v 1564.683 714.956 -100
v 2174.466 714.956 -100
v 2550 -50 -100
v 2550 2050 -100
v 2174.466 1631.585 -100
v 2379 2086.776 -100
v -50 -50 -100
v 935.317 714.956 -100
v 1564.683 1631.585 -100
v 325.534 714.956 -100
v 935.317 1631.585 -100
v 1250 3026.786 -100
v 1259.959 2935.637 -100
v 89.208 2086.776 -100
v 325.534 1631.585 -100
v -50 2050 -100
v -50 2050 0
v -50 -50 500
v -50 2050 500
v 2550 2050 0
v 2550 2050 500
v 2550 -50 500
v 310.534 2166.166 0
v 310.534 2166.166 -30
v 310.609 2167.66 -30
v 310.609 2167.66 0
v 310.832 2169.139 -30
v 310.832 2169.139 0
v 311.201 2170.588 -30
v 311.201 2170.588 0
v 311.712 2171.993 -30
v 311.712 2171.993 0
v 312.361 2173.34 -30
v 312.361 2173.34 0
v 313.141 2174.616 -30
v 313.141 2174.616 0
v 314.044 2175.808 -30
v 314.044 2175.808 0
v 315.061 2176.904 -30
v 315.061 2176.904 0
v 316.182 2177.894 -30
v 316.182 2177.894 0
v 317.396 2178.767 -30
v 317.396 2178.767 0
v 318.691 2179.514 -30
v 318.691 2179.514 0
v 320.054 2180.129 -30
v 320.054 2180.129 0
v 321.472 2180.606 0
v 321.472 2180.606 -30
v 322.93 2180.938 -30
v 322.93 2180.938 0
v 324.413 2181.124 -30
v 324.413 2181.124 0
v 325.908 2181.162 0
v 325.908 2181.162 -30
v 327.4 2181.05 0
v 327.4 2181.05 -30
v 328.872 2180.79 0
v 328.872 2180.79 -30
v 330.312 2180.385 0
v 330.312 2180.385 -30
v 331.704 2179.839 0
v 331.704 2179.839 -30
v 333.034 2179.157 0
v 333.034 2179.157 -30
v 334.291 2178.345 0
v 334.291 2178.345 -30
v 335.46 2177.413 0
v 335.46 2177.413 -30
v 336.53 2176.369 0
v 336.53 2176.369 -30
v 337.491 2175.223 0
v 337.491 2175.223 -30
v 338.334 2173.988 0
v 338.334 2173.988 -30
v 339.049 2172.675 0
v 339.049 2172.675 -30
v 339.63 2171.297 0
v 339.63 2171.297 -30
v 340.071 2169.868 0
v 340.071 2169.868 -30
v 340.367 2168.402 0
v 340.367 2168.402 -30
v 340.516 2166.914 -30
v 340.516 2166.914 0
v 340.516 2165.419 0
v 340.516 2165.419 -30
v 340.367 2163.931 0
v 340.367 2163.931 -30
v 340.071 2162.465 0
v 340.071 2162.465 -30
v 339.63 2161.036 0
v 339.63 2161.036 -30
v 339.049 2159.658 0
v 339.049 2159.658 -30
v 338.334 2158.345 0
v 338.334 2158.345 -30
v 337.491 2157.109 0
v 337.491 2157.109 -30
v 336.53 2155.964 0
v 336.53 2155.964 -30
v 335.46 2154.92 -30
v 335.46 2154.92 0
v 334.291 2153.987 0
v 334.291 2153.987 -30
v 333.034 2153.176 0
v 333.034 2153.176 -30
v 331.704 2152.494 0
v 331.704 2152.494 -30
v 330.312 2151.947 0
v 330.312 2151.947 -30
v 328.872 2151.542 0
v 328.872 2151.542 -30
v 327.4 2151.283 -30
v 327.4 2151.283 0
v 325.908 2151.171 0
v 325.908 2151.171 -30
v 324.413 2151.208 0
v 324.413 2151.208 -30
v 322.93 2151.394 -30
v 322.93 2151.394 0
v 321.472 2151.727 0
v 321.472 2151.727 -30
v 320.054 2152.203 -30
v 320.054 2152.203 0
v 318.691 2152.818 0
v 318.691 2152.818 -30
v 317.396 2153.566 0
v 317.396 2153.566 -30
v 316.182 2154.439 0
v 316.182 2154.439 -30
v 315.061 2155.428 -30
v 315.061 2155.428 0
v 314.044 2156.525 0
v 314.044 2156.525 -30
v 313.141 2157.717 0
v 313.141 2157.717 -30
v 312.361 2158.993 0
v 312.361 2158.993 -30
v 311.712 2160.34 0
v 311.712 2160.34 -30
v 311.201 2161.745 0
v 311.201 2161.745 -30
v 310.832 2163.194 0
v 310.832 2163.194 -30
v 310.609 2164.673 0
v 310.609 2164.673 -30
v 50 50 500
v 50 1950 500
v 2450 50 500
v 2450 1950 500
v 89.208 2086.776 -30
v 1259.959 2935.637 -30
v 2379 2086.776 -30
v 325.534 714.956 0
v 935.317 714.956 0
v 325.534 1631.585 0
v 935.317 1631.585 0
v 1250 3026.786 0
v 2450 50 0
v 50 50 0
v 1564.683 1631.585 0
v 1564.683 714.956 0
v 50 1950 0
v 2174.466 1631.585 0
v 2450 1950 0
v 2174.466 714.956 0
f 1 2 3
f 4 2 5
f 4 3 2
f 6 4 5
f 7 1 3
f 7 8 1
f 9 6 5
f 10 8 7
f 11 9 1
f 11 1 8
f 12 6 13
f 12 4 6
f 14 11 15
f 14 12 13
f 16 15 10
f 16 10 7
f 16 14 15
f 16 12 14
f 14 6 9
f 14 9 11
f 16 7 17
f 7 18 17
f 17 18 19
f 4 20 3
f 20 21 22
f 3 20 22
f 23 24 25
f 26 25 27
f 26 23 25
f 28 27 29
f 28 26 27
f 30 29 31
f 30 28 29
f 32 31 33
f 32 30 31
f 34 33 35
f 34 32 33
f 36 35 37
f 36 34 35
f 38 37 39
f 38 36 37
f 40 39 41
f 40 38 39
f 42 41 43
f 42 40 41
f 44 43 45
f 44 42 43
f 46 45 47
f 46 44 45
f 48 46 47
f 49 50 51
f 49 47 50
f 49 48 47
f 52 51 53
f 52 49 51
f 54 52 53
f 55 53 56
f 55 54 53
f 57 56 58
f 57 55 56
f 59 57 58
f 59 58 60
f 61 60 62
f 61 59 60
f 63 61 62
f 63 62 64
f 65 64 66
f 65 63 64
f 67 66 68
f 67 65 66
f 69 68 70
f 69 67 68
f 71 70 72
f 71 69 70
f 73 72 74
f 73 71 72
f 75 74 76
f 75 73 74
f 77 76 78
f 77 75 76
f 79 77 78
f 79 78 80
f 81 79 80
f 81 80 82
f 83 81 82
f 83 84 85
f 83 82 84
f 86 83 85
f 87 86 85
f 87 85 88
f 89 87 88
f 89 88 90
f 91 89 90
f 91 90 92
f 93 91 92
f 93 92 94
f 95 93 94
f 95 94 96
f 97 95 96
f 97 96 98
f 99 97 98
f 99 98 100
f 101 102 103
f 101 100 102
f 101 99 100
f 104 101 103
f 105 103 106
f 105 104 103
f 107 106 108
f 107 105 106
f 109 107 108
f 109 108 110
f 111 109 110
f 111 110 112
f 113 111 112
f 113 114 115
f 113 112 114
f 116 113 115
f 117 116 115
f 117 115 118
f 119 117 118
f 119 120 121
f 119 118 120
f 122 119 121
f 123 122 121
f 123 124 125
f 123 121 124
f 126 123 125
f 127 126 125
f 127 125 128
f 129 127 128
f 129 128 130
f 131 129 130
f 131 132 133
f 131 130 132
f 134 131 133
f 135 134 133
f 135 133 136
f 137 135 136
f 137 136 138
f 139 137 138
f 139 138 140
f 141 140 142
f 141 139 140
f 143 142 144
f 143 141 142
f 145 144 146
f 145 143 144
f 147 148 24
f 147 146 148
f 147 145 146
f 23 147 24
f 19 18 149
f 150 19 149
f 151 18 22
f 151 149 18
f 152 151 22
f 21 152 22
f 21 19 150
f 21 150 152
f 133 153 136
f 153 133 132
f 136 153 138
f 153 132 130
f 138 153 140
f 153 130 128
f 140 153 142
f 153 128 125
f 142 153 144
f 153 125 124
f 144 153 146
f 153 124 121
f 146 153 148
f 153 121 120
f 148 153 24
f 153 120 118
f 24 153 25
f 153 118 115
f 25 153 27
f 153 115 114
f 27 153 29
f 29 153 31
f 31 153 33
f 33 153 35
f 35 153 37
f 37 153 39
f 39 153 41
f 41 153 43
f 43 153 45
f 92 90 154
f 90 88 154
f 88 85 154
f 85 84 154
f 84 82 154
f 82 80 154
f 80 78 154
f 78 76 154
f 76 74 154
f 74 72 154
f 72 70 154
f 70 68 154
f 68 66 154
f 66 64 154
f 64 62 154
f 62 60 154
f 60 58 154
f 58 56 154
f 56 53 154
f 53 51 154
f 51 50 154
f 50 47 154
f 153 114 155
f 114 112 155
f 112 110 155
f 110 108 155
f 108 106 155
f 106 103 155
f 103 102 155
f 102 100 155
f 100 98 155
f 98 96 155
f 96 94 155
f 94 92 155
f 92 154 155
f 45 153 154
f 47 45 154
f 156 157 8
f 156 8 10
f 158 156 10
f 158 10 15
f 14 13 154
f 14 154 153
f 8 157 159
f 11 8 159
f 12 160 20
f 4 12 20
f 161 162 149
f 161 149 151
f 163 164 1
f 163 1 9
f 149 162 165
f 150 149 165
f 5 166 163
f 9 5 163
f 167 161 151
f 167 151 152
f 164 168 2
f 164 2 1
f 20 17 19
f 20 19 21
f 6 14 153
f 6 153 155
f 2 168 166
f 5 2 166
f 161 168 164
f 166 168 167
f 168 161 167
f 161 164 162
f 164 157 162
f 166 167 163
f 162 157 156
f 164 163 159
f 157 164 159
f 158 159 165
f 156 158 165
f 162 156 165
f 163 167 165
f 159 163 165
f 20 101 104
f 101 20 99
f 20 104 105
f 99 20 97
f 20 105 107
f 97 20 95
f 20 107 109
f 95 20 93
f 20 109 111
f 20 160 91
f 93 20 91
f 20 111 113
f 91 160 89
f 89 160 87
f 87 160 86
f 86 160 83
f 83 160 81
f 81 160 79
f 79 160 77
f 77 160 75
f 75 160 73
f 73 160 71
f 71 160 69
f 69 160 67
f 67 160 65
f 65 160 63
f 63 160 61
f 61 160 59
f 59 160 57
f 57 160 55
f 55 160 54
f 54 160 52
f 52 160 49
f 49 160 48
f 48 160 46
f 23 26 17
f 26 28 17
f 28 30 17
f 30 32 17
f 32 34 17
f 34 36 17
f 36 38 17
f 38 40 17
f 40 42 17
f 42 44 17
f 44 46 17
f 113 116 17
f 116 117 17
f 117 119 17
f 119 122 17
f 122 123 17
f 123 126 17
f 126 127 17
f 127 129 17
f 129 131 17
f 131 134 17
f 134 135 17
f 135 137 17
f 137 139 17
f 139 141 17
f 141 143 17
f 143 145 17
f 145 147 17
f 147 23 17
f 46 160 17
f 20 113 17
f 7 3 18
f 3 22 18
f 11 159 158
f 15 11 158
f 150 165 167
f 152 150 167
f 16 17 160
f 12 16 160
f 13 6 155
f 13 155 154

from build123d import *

# Parameters (mm, degrees)
SKETCH_2_W          = 2600
SKETCH_2_H          = 2100
SKETCH_2_W_2        = 2400
SKETCH_2_H_2        = 1900
EXTRUDE_1_DEPTH     = 500
SKETCH_3_R          = 15
SKETCH_3_W          = 609.782472484
SKETCH_3_H          = 916.628139727
EXTRUDE_1_2_DEPTH   = 100
CUT_EXTRUDE_1_DEPTH = 70


with BuildPart() as part:
    # Эскиз2 → Extrude 1 (new body)
    with BuildSketch(Plane.XY):
        with Locations((1250, 1000)):
            Rectangle(SKETCH_2_W, SKETCH_2_H)
        with Locations((1250, 1000)):
            Rectangle(SKETCH_2_W_2, SKETCH_2_H_2, mode=Mode.SUBTRACT)
    extrude(amount=EXTRUDE_1_DEPTH)

    # Эскиз3 → Extrude 1 2 (add)
    with BuildSketch(Plane(origin=(0, 0, 0), x_dir=(-1, 0, 0), z_dir=(0, 0, -1))):
        Polygon((-2550, 2050), (-2550, -50), (50, -50), (50, 2050), (-1250, 3026.785782271), align=None)
        with Locations((-325.534447993, 2166.166351537)):
            Circle(SKETCH_3_R, mode=Mode.SUBTRACT)
        with Locations((-630.425684235, 1173.270435634)):
            Rectangle(SKETCH_3_W, SKETCH_3_H, mode=Mode.SUBTRACT)
        with Locations((-1869.574315765, 1173.270435634)):
            Rectangle(SKETCH_3_W, SKETCH_3_H, mode=Mode.SUBTRACT)
    extrude(amount=EXTRUDE_1_2_DEPTH)

    # Эскиз4 → Вырез-Вытянуть1 (cut)
    with BuildSketch(Plane(origin=(0, 0, -100), x_dir=(-1, 0, 0), z_dir=(0, 0, -1))):
        Polygon((-2379.000274161, 2086.775717822), (-1259.958745803, 2935.636818267), (-89.207637204, 2086.775717822), align=None)
    extrude(amount=-CUT_EXTRUDE_1_DEPTH, mode=Mode.SUBTRACT)


solid = part.part
